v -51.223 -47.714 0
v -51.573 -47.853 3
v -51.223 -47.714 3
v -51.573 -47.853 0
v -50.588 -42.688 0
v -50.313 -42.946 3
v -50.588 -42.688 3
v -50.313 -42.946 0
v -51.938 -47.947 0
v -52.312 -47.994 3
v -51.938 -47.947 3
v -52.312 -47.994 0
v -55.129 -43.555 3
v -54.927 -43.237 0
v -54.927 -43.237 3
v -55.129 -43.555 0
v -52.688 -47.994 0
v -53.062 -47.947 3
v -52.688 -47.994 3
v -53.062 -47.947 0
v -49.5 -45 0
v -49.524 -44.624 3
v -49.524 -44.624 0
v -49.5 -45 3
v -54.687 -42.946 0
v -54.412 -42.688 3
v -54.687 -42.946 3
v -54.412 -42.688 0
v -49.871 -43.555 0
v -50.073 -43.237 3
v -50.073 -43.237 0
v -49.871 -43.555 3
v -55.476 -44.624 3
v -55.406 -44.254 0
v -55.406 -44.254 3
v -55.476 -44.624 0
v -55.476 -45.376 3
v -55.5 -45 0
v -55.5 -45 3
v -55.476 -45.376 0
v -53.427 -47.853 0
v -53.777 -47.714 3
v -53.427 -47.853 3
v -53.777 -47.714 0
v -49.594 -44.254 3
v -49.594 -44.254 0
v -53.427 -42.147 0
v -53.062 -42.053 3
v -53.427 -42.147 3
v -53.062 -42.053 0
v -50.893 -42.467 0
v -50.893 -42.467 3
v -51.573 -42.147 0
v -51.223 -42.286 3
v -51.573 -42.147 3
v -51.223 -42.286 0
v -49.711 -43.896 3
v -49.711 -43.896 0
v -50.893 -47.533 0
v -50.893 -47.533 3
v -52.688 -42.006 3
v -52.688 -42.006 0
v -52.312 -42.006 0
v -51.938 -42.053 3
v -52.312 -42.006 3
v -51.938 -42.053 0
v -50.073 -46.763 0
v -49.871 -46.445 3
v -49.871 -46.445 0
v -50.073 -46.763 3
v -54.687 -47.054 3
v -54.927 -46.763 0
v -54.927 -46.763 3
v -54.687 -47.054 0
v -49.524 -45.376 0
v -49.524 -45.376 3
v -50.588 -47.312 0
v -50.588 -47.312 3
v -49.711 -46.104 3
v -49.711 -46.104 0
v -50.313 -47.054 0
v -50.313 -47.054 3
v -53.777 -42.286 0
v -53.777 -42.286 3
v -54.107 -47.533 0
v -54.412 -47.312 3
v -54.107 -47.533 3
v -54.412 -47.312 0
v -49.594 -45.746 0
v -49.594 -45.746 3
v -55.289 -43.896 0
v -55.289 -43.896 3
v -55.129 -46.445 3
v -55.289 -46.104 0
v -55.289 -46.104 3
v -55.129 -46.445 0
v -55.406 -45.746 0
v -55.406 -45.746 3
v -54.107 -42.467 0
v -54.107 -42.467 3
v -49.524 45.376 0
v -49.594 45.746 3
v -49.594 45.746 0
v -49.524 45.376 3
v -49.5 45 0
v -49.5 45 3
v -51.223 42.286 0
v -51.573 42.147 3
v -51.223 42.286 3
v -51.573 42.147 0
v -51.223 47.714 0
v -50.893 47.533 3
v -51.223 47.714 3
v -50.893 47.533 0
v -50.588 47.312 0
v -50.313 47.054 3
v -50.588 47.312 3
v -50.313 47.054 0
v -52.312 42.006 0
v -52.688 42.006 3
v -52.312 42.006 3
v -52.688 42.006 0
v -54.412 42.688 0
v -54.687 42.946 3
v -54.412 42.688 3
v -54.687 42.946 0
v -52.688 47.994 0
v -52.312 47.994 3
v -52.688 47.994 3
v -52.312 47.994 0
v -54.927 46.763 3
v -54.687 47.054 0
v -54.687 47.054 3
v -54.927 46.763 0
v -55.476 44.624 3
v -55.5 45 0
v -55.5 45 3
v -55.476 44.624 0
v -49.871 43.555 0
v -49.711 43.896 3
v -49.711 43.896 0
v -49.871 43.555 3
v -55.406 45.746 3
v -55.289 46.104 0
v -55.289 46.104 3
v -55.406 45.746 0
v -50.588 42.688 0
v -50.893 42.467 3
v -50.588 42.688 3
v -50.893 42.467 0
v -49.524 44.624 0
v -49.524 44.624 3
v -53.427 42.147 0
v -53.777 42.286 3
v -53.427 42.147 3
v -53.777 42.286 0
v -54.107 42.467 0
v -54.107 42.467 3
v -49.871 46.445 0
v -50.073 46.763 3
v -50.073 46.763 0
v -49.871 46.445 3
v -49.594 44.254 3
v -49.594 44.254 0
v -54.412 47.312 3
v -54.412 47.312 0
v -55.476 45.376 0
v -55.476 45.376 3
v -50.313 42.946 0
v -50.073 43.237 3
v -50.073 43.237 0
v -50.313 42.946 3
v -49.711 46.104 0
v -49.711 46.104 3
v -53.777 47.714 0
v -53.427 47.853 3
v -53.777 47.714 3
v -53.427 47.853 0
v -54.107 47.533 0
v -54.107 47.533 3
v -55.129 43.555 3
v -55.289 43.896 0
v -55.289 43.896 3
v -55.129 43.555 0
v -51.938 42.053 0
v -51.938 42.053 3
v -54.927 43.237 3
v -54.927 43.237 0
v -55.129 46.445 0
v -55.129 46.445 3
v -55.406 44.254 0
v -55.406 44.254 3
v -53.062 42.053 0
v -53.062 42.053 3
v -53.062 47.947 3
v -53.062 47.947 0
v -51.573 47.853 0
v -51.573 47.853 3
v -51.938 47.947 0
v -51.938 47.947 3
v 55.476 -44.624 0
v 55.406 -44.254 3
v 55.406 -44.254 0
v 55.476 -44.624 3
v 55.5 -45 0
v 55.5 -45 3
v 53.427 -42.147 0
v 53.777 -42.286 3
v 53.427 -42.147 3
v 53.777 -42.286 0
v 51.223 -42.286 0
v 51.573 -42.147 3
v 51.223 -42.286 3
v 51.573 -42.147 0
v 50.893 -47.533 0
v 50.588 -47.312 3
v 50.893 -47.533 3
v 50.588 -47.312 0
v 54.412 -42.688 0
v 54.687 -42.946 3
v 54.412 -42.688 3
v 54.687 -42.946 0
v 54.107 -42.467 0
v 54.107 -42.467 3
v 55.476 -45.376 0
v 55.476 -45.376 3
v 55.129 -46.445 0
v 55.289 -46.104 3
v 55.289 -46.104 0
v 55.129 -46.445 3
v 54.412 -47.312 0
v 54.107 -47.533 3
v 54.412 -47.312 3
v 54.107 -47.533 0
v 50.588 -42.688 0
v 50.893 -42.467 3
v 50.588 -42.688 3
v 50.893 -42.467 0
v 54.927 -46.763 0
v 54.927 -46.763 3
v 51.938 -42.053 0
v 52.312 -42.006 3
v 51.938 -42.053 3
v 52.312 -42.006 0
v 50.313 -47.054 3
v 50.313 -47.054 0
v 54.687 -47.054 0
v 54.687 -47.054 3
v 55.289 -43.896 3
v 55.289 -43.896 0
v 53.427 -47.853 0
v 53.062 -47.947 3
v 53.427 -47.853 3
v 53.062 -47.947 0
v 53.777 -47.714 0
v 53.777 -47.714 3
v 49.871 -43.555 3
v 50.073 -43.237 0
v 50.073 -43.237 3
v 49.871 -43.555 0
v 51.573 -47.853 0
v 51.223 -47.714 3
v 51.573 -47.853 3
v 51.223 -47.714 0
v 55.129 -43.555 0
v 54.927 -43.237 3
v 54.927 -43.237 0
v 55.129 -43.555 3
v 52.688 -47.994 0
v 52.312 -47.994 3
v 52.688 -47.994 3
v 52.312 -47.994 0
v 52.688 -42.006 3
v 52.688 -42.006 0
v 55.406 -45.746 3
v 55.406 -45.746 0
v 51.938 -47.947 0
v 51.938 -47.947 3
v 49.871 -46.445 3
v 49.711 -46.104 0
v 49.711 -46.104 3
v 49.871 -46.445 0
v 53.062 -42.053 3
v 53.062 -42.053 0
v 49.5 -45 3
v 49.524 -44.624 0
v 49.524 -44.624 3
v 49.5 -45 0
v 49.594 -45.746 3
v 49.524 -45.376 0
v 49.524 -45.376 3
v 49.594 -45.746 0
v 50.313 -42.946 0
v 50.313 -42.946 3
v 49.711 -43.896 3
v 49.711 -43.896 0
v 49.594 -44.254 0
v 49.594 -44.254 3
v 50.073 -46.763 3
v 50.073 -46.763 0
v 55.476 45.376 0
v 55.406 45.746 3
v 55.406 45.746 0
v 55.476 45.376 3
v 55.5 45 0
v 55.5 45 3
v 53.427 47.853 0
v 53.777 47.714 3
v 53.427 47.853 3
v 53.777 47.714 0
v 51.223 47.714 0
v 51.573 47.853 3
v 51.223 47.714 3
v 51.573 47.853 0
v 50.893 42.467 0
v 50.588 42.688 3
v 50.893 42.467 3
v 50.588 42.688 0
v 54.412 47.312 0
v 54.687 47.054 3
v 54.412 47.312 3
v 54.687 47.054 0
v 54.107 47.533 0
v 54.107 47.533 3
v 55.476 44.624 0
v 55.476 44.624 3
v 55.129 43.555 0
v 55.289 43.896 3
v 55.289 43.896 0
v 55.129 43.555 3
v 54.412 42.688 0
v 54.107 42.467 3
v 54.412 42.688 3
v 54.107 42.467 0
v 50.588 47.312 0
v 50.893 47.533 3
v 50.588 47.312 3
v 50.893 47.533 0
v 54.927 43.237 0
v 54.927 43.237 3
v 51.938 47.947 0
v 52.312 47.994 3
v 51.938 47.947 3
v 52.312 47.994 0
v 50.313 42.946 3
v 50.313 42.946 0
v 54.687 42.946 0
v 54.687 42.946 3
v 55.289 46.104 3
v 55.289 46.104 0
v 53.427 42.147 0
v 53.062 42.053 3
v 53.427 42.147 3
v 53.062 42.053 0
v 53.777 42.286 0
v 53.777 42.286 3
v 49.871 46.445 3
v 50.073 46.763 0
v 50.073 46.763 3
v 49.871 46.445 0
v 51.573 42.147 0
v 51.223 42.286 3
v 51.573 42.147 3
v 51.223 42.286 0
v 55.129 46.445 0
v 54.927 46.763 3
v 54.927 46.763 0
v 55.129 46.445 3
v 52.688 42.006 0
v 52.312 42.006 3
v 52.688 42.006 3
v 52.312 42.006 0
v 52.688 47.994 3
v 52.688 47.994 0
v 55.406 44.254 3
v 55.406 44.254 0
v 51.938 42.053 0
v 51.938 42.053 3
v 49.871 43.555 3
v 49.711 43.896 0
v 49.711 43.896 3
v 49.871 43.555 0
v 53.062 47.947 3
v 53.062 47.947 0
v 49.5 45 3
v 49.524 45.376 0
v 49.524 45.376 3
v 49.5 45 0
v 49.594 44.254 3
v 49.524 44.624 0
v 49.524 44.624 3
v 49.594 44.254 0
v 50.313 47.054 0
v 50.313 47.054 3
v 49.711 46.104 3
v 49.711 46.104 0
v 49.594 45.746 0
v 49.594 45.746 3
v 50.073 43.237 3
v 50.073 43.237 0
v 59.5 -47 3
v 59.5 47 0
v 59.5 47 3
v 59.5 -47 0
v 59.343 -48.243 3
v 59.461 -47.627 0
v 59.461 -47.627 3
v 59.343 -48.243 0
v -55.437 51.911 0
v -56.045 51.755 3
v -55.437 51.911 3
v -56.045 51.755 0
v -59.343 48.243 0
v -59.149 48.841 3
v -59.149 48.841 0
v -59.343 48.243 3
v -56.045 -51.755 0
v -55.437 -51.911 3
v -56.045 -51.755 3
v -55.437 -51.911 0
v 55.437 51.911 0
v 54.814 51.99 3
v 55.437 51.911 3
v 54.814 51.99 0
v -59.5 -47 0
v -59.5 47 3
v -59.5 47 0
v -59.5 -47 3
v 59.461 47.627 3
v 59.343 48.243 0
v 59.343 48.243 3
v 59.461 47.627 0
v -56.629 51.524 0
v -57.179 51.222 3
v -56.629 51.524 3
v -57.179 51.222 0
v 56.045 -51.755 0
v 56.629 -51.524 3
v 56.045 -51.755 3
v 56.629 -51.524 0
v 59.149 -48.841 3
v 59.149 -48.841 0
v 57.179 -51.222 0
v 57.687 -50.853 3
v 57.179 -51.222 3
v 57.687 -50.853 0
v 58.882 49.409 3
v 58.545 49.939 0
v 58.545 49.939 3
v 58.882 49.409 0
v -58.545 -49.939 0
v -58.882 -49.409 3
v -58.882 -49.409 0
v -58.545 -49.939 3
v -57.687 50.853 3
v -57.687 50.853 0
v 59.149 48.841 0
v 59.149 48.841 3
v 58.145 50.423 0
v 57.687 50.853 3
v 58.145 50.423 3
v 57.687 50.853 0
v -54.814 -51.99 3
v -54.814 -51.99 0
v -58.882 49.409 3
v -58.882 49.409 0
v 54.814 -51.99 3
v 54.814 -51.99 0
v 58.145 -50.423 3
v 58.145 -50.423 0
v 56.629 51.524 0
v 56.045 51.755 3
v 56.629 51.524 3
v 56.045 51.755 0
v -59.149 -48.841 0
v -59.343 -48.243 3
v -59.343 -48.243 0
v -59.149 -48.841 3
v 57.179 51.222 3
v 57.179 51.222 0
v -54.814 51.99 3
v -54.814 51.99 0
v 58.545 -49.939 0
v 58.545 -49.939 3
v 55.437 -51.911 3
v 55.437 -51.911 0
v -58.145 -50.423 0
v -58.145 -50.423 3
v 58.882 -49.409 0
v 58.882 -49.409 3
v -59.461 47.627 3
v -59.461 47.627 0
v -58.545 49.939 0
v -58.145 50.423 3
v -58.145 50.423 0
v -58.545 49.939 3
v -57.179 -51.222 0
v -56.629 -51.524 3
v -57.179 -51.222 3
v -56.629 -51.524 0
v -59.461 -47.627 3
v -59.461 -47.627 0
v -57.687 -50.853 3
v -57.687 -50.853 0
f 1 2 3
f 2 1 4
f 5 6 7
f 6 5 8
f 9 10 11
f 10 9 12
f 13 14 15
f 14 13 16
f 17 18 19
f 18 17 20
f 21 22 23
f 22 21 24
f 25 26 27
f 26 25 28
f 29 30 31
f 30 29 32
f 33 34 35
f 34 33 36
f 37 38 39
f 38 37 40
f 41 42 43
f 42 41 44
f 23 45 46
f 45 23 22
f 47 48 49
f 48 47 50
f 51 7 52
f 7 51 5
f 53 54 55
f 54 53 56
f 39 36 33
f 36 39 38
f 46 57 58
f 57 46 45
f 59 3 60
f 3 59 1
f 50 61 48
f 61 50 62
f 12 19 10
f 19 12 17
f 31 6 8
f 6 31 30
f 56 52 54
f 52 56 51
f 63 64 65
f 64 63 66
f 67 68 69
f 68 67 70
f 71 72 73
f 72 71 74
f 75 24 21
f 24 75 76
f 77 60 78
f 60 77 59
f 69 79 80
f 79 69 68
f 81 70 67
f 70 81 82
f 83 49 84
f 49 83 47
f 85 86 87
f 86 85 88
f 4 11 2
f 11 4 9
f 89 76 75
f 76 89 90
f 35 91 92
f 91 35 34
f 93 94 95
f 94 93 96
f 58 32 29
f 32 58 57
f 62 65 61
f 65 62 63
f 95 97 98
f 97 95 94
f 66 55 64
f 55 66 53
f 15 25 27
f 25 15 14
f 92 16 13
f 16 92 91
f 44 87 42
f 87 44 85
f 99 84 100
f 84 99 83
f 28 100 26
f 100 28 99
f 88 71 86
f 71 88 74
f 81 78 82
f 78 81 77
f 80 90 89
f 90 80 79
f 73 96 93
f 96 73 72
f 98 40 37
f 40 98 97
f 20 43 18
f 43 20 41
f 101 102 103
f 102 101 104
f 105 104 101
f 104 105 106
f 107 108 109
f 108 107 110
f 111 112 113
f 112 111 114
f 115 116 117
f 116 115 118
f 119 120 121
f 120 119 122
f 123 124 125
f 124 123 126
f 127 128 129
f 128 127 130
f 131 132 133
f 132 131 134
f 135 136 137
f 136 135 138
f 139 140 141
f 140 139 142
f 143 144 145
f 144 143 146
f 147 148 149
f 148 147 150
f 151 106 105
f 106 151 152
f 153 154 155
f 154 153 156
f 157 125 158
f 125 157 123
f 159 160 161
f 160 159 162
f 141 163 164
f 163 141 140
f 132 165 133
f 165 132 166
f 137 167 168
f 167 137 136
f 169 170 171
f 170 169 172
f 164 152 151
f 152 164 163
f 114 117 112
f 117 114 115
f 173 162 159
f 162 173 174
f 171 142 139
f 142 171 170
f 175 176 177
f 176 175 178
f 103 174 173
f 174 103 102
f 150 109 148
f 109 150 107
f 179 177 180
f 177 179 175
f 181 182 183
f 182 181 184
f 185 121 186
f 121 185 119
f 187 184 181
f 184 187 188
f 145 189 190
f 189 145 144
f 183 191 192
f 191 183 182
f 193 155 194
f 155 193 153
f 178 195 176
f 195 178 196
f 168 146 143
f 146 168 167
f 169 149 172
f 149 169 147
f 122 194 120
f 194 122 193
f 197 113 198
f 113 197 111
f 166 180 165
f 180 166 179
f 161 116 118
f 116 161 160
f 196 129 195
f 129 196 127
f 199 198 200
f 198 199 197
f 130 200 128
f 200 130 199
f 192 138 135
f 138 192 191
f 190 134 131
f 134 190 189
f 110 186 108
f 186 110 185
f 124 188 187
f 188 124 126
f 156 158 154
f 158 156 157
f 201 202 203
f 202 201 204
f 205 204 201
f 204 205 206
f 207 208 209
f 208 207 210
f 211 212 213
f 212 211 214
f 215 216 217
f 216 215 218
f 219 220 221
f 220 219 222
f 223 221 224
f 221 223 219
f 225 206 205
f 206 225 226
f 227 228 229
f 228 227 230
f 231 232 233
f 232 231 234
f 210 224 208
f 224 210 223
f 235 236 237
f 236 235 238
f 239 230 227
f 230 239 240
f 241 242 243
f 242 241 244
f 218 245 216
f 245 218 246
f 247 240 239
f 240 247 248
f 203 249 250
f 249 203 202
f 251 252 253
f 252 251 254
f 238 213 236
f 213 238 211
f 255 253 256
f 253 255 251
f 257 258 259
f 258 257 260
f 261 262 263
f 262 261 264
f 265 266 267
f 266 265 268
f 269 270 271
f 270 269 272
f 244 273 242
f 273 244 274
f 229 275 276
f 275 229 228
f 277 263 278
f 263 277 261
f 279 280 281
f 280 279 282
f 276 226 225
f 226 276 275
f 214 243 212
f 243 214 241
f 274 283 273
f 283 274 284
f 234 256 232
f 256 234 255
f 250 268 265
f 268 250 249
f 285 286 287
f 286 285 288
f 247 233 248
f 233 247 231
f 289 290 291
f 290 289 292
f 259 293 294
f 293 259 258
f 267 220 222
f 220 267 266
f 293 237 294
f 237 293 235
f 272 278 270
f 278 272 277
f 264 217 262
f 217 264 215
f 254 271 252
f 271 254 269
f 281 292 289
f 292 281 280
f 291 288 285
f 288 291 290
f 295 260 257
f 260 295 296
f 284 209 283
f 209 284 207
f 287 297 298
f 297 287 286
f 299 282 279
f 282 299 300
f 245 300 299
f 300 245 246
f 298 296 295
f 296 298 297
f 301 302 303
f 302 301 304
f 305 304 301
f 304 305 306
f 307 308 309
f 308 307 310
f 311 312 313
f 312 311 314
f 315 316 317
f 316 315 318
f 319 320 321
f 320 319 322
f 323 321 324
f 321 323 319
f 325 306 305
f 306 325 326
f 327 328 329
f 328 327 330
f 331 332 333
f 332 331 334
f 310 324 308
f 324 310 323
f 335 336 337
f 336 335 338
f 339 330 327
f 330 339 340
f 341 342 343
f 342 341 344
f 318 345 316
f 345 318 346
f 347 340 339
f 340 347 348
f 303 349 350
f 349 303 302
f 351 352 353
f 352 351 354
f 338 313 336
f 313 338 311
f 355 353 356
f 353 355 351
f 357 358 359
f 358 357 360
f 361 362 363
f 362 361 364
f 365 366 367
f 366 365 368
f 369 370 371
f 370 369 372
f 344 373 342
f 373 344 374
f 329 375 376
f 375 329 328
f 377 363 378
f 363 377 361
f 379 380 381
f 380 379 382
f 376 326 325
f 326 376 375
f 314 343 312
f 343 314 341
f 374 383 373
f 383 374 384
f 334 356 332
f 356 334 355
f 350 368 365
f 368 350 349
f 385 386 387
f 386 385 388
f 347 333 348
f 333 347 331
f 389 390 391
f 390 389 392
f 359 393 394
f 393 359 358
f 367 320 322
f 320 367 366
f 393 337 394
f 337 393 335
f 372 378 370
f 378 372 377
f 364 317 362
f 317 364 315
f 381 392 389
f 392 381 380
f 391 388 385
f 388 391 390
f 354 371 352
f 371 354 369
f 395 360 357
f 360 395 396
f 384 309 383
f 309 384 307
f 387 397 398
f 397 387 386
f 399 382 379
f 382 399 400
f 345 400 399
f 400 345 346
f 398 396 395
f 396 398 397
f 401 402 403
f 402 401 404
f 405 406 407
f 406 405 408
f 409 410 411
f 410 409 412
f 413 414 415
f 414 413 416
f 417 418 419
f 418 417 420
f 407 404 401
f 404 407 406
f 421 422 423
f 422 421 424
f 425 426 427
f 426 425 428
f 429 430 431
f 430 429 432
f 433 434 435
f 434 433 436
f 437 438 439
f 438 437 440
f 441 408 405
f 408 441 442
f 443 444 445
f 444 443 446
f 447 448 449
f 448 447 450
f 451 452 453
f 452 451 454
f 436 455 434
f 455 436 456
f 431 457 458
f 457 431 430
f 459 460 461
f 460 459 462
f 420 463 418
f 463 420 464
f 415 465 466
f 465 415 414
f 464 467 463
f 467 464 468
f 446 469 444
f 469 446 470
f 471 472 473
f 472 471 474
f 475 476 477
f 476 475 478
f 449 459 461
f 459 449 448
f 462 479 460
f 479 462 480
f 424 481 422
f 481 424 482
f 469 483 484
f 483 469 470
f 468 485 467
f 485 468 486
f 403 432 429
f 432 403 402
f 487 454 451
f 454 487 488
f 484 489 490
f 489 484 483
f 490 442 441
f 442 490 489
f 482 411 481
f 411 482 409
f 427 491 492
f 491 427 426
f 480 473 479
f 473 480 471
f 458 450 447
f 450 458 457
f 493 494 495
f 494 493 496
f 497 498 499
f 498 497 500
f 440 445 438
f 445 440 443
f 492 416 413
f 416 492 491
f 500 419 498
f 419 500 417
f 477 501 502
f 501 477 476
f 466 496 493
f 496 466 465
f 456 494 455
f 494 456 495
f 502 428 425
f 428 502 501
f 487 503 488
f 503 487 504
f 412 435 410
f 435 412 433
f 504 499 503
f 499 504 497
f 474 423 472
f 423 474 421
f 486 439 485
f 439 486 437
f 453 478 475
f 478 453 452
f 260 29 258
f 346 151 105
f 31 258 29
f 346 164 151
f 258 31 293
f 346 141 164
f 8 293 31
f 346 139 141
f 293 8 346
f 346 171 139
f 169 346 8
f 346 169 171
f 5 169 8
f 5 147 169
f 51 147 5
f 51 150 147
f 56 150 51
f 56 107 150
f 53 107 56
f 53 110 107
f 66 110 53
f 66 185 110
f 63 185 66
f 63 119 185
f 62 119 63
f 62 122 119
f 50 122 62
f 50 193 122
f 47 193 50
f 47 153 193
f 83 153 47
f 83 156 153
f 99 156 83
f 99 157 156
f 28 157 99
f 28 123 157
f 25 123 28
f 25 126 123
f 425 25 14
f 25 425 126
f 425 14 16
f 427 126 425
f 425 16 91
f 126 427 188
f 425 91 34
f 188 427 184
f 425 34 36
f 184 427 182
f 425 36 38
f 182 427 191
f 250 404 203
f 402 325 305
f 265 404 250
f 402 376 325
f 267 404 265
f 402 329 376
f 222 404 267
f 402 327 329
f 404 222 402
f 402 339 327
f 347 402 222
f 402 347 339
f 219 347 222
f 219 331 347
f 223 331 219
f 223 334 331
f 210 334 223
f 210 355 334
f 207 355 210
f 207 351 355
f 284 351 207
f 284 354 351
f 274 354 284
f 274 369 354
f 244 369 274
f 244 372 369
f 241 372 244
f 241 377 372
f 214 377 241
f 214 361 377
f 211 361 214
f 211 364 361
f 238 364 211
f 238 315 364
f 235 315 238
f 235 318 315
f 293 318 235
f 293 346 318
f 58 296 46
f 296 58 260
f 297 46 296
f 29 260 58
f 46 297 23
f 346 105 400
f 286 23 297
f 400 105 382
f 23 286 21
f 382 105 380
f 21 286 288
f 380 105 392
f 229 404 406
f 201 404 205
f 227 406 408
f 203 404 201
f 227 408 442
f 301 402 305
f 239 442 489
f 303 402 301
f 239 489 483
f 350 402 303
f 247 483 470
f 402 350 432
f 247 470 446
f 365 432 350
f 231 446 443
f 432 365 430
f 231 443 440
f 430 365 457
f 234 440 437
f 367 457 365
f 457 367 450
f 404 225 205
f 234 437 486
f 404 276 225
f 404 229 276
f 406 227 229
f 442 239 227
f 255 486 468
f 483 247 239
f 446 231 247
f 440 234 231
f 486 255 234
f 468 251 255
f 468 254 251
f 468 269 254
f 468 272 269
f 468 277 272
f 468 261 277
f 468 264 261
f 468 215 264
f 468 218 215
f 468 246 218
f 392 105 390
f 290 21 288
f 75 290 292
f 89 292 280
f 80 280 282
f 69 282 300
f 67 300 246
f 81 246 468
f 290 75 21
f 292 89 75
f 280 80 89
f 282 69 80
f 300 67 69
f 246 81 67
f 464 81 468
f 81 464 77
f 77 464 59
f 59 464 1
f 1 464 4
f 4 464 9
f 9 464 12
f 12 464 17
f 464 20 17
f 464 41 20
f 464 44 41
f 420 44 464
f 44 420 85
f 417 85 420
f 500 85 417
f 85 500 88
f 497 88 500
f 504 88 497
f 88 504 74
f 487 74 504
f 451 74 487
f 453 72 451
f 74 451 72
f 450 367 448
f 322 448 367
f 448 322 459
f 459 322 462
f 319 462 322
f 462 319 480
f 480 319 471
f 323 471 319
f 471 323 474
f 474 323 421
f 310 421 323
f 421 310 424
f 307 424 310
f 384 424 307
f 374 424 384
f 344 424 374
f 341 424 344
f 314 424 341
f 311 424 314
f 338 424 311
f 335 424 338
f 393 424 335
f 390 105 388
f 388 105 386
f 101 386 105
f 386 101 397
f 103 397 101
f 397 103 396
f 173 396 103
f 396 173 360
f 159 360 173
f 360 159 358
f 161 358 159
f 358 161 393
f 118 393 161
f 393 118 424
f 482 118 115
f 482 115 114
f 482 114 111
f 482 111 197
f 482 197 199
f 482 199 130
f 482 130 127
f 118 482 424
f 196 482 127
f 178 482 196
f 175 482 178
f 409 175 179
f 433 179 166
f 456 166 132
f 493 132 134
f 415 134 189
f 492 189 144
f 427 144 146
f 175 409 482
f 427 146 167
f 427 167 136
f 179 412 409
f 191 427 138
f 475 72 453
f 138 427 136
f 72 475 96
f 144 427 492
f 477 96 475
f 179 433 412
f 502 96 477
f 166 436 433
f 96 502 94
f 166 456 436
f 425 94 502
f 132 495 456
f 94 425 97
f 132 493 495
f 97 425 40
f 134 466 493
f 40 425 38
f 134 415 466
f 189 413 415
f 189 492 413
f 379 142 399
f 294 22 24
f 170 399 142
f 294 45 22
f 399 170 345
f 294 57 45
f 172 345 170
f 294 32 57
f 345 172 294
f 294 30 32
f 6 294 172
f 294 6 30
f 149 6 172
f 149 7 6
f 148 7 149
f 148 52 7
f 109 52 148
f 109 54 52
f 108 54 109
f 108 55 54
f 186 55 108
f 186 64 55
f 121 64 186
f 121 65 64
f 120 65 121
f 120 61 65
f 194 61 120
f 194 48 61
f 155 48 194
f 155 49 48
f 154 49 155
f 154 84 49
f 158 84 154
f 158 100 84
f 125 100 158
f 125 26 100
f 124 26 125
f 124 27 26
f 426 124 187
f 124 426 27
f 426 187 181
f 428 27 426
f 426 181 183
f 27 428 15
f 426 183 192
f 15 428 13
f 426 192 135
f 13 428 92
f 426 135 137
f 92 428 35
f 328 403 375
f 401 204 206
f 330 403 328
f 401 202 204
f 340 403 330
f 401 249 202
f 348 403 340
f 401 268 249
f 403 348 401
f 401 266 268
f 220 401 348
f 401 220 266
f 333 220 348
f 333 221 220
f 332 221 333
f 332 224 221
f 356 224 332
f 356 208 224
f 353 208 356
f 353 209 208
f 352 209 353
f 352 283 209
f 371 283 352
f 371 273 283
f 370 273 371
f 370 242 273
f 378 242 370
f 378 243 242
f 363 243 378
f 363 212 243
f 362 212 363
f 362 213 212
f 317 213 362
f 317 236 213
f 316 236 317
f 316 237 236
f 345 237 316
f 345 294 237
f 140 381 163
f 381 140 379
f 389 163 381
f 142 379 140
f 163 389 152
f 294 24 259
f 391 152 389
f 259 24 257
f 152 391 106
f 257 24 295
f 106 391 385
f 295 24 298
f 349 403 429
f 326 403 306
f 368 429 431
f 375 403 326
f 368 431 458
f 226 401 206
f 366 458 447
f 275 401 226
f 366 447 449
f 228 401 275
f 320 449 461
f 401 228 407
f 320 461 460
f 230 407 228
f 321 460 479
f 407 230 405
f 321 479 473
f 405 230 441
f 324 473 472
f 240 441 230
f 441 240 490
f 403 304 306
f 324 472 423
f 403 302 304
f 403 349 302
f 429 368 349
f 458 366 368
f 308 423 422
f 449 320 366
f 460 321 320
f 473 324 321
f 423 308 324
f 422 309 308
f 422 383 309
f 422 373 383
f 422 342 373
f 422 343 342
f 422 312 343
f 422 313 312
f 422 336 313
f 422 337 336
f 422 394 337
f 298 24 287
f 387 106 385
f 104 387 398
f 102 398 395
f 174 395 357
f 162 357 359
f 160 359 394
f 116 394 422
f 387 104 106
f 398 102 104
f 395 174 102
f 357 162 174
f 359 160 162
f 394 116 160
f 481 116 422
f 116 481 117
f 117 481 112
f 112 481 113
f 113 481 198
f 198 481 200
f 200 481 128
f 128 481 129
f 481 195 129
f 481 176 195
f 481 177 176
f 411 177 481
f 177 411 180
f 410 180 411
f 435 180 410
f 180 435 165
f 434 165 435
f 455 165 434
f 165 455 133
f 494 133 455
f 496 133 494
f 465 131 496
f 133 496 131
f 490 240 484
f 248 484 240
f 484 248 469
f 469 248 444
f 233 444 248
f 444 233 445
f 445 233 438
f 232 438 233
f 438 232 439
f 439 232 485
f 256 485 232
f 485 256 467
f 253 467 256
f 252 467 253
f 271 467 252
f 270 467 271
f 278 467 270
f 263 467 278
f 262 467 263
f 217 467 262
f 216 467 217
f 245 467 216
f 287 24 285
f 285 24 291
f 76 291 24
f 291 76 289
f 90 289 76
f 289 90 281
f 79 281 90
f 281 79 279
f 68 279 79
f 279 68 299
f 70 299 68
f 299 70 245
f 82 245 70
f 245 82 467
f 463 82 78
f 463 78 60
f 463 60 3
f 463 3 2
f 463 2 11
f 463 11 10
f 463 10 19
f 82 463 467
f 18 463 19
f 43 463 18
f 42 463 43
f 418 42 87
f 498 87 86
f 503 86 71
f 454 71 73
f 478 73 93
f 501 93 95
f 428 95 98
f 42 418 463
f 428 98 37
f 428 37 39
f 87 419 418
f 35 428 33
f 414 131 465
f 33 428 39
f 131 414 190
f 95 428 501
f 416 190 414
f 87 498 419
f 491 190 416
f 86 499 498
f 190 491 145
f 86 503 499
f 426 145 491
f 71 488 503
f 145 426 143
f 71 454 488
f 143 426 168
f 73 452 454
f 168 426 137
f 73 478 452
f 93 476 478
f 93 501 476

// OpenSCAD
$fn = 50;


difference() {
	union() {
		hull() {
			translate(v = [-54.5000000000, 47.0000000000, 0]) {
				cylinder(h = 3, r = 5);
			}
			translate(v = [54.5000000000, 47.0000000000, 0]) {
				cylinder(h = 3, r = 5);
			}
			translate(v = [-54.5000000000, -47.0000000000, 0]) {
				cylinder(h = 3, r = 5);
			}
			translate(v = [54.5000000000, -47.0000000000, 0]) {
				cylinder(h = 3, r = 5);
			}
		}
	}
	union() {
		translate(v = [-52.5000000000, -45.0000000000, -100.0000000000]) {
			cylinder(h = 200, r = 3.0000000000);
		}
		translate(v = [-52.5000000000, 45.0000000000, -100.0000000000]) {
			cylinder(h = 200, r = 3.0000000000);
		}
		translate(v = [52.5000000000, -45.0000000000, -100.0000000000]) {
			cylinder(h = 200, r = 3.0000000000);
		}
		translate(v = [52.5000000000, 45.0000000000, -100.0000000000]) {
			cylinder(h = 200, r = 3.0000000000);
		}
	}
}
